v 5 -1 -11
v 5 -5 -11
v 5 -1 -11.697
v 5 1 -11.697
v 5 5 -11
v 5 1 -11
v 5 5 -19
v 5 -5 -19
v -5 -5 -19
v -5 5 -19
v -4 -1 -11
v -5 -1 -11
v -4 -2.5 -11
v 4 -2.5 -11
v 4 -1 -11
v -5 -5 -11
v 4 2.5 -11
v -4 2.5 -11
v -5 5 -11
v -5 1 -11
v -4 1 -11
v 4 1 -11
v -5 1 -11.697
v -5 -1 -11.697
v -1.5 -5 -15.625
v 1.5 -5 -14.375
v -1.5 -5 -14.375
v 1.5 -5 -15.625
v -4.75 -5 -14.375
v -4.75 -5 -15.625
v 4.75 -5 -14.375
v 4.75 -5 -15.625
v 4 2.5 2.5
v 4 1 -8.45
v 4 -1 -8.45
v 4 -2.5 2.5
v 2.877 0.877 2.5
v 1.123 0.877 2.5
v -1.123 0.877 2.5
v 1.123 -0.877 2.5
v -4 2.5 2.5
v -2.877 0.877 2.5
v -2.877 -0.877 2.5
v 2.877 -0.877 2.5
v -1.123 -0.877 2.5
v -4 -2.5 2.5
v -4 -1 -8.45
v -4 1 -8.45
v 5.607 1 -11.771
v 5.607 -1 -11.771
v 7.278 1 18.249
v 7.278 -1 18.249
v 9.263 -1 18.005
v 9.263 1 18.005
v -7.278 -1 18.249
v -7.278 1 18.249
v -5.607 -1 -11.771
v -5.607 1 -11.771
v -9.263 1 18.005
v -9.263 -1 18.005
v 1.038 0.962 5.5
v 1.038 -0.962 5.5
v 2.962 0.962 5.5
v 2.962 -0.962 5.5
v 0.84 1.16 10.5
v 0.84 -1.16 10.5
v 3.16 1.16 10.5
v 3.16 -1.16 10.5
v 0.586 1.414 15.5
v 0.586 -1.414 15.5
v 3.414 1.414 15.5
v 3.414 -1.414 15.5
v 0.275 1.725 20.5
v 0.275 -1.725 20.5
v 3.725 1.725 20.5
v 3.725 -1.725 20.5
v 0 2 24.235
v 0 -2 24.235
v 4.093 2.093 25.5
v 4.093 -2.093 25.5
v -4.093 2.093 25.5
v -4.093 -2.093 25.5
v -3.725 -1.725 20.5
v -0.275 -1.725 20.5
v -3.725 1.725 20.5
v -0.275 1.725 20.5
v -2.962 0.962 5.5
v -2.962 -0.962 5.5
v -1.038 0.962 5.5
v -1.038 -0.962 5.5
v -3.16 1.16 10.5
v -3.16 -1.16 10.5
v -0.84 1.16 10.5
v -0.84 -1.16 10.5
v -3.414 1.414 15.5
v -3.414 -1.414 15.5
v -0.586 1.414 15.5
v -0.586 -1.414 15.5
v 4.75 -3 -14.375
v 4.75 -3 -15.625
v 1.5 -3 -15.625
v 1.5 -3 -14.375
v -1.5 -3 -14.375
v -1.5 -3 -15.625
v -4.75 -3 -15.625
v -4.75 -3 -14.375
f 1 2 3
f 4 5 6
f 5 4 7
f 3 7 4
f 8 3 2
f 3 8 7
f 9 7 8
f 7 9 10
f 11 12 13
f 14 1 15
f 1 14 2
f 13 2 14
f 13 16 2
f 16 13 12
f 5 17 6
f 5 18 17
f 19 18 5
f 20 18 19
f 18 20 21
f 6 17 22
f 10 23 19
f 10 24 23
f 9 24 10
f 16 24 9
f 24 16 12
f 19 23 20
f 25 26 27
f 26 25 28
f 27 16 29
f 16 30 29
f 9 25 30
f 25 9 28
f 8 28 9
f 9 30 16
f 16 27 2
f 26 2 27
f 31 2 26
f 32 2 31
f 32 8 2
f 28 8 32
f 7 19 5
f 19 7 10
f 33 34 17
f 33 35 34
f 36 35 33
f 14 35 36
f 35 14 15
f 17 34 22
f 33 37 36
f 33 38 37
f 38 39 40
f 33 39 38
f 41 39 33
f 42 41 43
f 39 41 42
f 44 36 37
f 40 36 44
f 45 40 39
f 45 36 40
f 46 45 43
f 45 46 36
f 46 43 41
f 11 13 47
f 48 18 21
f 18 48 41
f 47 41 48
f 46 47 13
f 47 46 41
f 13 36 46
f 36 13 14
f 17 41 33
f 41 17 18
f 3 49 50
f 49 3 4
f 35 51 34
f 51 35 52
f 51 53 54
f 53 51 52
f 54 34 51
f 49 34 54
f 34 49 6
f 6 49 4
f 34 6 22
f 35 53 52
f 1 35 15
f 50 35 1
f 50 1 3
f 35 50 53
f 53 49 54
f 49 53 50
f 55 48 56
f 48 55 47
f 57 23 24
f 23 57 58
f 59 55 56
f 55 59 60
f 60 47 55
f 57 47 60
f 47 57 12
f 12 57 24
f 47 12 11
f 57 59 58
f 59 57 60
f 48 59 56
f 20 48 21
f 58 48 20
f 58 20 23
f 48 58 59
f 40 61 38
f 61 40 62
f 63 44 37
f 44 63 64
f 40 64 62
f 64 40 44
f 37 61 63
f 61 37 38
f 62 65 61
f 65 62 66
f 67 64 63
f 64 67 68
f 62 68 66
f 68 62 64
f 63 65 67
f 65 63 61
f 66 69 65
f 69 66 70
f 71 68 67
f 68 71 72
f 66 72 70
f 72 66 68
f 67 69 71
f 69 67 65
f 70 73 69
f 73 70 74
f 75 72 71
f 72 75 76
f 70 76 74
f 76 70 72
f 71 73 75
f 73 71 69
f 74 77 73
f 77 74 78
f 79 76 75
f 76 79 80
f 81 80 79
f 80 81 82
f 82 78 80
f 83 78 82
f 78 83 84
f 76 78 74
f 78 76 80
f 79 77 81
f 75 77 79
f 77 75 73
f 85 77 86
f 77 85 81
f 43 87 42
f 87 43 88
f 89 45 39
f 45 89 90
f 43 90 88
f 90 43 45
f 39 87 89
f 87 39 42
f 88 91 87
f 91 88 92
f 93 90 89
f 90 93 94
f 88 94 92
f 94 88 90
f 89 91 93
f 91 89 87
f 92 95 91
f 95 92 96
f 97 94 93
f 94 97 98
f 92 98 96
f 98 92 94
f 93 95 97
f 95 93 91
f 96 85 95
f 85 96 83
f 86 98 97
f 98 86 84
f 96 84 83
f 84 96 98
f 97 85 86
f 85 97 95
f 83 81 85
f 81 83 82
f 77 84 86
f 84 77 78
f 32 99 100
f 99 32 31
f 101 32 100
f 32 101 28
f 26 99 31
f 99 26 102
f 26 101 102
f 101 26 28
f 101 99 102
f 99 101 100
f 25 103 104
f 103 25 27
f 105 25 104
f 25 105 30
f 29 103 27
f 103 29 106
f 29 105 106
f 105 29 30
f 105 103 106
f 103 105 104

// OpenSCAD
head=10;
ancho=6*head/10;
miniancho=2*head/10;

//module for legs
module parab_leg(altura,lrate,first,iter) {
	for(i=[1:iter])
		{translate([0,0,(i-1)*altura]) cylinder(h=altura,r1=lrate*i*i+first,r2=lrate*(i+1)*(i+1)+first,center=true,$fn=4);}
}

rotate([180,0,0])
color("Indigo")
difference(){
	union() {
		union() {
			union() {
					//head	
					translate([0,0,3*head/2])
					cube([head,head,head*0.8],center=true);
	
					//body
					translate([0,0,5])
					cube([head*0.8,0.5*head,3*head/2],center=true);
					}
						//arms
						rotate([0,-7,0])
						translate([head*0.6,0,-head*0.4])	
						cube([miniancho,miniancho,2.5*head+5],center=true);
	
						rotate([0,7,0])
						translate([-head*0.6,0,-head*0.4])
						cube([miniancho,miniancho,2.5*head+5],center=true);
	
				}
			//legs
			translate([head*0.2,0,head*0.2])
			rotate([180,0,45])
			parab_leg(5,0.04,1,6);
	
			translate([-head*0.2,0,head*0.2])
			rotate([180,0,45])
			parab_leg(5,0.04,1,6);
			}

	//eyes
	translate([5*head/16,head*0.8,1.5*head])
	cube([2.6*head/8,head,head/8],center=true);

	translate([-5*head/16,head*0.8,1.5*head])
	cube([2.6*head/8,head,head/8],center=true);
	}
